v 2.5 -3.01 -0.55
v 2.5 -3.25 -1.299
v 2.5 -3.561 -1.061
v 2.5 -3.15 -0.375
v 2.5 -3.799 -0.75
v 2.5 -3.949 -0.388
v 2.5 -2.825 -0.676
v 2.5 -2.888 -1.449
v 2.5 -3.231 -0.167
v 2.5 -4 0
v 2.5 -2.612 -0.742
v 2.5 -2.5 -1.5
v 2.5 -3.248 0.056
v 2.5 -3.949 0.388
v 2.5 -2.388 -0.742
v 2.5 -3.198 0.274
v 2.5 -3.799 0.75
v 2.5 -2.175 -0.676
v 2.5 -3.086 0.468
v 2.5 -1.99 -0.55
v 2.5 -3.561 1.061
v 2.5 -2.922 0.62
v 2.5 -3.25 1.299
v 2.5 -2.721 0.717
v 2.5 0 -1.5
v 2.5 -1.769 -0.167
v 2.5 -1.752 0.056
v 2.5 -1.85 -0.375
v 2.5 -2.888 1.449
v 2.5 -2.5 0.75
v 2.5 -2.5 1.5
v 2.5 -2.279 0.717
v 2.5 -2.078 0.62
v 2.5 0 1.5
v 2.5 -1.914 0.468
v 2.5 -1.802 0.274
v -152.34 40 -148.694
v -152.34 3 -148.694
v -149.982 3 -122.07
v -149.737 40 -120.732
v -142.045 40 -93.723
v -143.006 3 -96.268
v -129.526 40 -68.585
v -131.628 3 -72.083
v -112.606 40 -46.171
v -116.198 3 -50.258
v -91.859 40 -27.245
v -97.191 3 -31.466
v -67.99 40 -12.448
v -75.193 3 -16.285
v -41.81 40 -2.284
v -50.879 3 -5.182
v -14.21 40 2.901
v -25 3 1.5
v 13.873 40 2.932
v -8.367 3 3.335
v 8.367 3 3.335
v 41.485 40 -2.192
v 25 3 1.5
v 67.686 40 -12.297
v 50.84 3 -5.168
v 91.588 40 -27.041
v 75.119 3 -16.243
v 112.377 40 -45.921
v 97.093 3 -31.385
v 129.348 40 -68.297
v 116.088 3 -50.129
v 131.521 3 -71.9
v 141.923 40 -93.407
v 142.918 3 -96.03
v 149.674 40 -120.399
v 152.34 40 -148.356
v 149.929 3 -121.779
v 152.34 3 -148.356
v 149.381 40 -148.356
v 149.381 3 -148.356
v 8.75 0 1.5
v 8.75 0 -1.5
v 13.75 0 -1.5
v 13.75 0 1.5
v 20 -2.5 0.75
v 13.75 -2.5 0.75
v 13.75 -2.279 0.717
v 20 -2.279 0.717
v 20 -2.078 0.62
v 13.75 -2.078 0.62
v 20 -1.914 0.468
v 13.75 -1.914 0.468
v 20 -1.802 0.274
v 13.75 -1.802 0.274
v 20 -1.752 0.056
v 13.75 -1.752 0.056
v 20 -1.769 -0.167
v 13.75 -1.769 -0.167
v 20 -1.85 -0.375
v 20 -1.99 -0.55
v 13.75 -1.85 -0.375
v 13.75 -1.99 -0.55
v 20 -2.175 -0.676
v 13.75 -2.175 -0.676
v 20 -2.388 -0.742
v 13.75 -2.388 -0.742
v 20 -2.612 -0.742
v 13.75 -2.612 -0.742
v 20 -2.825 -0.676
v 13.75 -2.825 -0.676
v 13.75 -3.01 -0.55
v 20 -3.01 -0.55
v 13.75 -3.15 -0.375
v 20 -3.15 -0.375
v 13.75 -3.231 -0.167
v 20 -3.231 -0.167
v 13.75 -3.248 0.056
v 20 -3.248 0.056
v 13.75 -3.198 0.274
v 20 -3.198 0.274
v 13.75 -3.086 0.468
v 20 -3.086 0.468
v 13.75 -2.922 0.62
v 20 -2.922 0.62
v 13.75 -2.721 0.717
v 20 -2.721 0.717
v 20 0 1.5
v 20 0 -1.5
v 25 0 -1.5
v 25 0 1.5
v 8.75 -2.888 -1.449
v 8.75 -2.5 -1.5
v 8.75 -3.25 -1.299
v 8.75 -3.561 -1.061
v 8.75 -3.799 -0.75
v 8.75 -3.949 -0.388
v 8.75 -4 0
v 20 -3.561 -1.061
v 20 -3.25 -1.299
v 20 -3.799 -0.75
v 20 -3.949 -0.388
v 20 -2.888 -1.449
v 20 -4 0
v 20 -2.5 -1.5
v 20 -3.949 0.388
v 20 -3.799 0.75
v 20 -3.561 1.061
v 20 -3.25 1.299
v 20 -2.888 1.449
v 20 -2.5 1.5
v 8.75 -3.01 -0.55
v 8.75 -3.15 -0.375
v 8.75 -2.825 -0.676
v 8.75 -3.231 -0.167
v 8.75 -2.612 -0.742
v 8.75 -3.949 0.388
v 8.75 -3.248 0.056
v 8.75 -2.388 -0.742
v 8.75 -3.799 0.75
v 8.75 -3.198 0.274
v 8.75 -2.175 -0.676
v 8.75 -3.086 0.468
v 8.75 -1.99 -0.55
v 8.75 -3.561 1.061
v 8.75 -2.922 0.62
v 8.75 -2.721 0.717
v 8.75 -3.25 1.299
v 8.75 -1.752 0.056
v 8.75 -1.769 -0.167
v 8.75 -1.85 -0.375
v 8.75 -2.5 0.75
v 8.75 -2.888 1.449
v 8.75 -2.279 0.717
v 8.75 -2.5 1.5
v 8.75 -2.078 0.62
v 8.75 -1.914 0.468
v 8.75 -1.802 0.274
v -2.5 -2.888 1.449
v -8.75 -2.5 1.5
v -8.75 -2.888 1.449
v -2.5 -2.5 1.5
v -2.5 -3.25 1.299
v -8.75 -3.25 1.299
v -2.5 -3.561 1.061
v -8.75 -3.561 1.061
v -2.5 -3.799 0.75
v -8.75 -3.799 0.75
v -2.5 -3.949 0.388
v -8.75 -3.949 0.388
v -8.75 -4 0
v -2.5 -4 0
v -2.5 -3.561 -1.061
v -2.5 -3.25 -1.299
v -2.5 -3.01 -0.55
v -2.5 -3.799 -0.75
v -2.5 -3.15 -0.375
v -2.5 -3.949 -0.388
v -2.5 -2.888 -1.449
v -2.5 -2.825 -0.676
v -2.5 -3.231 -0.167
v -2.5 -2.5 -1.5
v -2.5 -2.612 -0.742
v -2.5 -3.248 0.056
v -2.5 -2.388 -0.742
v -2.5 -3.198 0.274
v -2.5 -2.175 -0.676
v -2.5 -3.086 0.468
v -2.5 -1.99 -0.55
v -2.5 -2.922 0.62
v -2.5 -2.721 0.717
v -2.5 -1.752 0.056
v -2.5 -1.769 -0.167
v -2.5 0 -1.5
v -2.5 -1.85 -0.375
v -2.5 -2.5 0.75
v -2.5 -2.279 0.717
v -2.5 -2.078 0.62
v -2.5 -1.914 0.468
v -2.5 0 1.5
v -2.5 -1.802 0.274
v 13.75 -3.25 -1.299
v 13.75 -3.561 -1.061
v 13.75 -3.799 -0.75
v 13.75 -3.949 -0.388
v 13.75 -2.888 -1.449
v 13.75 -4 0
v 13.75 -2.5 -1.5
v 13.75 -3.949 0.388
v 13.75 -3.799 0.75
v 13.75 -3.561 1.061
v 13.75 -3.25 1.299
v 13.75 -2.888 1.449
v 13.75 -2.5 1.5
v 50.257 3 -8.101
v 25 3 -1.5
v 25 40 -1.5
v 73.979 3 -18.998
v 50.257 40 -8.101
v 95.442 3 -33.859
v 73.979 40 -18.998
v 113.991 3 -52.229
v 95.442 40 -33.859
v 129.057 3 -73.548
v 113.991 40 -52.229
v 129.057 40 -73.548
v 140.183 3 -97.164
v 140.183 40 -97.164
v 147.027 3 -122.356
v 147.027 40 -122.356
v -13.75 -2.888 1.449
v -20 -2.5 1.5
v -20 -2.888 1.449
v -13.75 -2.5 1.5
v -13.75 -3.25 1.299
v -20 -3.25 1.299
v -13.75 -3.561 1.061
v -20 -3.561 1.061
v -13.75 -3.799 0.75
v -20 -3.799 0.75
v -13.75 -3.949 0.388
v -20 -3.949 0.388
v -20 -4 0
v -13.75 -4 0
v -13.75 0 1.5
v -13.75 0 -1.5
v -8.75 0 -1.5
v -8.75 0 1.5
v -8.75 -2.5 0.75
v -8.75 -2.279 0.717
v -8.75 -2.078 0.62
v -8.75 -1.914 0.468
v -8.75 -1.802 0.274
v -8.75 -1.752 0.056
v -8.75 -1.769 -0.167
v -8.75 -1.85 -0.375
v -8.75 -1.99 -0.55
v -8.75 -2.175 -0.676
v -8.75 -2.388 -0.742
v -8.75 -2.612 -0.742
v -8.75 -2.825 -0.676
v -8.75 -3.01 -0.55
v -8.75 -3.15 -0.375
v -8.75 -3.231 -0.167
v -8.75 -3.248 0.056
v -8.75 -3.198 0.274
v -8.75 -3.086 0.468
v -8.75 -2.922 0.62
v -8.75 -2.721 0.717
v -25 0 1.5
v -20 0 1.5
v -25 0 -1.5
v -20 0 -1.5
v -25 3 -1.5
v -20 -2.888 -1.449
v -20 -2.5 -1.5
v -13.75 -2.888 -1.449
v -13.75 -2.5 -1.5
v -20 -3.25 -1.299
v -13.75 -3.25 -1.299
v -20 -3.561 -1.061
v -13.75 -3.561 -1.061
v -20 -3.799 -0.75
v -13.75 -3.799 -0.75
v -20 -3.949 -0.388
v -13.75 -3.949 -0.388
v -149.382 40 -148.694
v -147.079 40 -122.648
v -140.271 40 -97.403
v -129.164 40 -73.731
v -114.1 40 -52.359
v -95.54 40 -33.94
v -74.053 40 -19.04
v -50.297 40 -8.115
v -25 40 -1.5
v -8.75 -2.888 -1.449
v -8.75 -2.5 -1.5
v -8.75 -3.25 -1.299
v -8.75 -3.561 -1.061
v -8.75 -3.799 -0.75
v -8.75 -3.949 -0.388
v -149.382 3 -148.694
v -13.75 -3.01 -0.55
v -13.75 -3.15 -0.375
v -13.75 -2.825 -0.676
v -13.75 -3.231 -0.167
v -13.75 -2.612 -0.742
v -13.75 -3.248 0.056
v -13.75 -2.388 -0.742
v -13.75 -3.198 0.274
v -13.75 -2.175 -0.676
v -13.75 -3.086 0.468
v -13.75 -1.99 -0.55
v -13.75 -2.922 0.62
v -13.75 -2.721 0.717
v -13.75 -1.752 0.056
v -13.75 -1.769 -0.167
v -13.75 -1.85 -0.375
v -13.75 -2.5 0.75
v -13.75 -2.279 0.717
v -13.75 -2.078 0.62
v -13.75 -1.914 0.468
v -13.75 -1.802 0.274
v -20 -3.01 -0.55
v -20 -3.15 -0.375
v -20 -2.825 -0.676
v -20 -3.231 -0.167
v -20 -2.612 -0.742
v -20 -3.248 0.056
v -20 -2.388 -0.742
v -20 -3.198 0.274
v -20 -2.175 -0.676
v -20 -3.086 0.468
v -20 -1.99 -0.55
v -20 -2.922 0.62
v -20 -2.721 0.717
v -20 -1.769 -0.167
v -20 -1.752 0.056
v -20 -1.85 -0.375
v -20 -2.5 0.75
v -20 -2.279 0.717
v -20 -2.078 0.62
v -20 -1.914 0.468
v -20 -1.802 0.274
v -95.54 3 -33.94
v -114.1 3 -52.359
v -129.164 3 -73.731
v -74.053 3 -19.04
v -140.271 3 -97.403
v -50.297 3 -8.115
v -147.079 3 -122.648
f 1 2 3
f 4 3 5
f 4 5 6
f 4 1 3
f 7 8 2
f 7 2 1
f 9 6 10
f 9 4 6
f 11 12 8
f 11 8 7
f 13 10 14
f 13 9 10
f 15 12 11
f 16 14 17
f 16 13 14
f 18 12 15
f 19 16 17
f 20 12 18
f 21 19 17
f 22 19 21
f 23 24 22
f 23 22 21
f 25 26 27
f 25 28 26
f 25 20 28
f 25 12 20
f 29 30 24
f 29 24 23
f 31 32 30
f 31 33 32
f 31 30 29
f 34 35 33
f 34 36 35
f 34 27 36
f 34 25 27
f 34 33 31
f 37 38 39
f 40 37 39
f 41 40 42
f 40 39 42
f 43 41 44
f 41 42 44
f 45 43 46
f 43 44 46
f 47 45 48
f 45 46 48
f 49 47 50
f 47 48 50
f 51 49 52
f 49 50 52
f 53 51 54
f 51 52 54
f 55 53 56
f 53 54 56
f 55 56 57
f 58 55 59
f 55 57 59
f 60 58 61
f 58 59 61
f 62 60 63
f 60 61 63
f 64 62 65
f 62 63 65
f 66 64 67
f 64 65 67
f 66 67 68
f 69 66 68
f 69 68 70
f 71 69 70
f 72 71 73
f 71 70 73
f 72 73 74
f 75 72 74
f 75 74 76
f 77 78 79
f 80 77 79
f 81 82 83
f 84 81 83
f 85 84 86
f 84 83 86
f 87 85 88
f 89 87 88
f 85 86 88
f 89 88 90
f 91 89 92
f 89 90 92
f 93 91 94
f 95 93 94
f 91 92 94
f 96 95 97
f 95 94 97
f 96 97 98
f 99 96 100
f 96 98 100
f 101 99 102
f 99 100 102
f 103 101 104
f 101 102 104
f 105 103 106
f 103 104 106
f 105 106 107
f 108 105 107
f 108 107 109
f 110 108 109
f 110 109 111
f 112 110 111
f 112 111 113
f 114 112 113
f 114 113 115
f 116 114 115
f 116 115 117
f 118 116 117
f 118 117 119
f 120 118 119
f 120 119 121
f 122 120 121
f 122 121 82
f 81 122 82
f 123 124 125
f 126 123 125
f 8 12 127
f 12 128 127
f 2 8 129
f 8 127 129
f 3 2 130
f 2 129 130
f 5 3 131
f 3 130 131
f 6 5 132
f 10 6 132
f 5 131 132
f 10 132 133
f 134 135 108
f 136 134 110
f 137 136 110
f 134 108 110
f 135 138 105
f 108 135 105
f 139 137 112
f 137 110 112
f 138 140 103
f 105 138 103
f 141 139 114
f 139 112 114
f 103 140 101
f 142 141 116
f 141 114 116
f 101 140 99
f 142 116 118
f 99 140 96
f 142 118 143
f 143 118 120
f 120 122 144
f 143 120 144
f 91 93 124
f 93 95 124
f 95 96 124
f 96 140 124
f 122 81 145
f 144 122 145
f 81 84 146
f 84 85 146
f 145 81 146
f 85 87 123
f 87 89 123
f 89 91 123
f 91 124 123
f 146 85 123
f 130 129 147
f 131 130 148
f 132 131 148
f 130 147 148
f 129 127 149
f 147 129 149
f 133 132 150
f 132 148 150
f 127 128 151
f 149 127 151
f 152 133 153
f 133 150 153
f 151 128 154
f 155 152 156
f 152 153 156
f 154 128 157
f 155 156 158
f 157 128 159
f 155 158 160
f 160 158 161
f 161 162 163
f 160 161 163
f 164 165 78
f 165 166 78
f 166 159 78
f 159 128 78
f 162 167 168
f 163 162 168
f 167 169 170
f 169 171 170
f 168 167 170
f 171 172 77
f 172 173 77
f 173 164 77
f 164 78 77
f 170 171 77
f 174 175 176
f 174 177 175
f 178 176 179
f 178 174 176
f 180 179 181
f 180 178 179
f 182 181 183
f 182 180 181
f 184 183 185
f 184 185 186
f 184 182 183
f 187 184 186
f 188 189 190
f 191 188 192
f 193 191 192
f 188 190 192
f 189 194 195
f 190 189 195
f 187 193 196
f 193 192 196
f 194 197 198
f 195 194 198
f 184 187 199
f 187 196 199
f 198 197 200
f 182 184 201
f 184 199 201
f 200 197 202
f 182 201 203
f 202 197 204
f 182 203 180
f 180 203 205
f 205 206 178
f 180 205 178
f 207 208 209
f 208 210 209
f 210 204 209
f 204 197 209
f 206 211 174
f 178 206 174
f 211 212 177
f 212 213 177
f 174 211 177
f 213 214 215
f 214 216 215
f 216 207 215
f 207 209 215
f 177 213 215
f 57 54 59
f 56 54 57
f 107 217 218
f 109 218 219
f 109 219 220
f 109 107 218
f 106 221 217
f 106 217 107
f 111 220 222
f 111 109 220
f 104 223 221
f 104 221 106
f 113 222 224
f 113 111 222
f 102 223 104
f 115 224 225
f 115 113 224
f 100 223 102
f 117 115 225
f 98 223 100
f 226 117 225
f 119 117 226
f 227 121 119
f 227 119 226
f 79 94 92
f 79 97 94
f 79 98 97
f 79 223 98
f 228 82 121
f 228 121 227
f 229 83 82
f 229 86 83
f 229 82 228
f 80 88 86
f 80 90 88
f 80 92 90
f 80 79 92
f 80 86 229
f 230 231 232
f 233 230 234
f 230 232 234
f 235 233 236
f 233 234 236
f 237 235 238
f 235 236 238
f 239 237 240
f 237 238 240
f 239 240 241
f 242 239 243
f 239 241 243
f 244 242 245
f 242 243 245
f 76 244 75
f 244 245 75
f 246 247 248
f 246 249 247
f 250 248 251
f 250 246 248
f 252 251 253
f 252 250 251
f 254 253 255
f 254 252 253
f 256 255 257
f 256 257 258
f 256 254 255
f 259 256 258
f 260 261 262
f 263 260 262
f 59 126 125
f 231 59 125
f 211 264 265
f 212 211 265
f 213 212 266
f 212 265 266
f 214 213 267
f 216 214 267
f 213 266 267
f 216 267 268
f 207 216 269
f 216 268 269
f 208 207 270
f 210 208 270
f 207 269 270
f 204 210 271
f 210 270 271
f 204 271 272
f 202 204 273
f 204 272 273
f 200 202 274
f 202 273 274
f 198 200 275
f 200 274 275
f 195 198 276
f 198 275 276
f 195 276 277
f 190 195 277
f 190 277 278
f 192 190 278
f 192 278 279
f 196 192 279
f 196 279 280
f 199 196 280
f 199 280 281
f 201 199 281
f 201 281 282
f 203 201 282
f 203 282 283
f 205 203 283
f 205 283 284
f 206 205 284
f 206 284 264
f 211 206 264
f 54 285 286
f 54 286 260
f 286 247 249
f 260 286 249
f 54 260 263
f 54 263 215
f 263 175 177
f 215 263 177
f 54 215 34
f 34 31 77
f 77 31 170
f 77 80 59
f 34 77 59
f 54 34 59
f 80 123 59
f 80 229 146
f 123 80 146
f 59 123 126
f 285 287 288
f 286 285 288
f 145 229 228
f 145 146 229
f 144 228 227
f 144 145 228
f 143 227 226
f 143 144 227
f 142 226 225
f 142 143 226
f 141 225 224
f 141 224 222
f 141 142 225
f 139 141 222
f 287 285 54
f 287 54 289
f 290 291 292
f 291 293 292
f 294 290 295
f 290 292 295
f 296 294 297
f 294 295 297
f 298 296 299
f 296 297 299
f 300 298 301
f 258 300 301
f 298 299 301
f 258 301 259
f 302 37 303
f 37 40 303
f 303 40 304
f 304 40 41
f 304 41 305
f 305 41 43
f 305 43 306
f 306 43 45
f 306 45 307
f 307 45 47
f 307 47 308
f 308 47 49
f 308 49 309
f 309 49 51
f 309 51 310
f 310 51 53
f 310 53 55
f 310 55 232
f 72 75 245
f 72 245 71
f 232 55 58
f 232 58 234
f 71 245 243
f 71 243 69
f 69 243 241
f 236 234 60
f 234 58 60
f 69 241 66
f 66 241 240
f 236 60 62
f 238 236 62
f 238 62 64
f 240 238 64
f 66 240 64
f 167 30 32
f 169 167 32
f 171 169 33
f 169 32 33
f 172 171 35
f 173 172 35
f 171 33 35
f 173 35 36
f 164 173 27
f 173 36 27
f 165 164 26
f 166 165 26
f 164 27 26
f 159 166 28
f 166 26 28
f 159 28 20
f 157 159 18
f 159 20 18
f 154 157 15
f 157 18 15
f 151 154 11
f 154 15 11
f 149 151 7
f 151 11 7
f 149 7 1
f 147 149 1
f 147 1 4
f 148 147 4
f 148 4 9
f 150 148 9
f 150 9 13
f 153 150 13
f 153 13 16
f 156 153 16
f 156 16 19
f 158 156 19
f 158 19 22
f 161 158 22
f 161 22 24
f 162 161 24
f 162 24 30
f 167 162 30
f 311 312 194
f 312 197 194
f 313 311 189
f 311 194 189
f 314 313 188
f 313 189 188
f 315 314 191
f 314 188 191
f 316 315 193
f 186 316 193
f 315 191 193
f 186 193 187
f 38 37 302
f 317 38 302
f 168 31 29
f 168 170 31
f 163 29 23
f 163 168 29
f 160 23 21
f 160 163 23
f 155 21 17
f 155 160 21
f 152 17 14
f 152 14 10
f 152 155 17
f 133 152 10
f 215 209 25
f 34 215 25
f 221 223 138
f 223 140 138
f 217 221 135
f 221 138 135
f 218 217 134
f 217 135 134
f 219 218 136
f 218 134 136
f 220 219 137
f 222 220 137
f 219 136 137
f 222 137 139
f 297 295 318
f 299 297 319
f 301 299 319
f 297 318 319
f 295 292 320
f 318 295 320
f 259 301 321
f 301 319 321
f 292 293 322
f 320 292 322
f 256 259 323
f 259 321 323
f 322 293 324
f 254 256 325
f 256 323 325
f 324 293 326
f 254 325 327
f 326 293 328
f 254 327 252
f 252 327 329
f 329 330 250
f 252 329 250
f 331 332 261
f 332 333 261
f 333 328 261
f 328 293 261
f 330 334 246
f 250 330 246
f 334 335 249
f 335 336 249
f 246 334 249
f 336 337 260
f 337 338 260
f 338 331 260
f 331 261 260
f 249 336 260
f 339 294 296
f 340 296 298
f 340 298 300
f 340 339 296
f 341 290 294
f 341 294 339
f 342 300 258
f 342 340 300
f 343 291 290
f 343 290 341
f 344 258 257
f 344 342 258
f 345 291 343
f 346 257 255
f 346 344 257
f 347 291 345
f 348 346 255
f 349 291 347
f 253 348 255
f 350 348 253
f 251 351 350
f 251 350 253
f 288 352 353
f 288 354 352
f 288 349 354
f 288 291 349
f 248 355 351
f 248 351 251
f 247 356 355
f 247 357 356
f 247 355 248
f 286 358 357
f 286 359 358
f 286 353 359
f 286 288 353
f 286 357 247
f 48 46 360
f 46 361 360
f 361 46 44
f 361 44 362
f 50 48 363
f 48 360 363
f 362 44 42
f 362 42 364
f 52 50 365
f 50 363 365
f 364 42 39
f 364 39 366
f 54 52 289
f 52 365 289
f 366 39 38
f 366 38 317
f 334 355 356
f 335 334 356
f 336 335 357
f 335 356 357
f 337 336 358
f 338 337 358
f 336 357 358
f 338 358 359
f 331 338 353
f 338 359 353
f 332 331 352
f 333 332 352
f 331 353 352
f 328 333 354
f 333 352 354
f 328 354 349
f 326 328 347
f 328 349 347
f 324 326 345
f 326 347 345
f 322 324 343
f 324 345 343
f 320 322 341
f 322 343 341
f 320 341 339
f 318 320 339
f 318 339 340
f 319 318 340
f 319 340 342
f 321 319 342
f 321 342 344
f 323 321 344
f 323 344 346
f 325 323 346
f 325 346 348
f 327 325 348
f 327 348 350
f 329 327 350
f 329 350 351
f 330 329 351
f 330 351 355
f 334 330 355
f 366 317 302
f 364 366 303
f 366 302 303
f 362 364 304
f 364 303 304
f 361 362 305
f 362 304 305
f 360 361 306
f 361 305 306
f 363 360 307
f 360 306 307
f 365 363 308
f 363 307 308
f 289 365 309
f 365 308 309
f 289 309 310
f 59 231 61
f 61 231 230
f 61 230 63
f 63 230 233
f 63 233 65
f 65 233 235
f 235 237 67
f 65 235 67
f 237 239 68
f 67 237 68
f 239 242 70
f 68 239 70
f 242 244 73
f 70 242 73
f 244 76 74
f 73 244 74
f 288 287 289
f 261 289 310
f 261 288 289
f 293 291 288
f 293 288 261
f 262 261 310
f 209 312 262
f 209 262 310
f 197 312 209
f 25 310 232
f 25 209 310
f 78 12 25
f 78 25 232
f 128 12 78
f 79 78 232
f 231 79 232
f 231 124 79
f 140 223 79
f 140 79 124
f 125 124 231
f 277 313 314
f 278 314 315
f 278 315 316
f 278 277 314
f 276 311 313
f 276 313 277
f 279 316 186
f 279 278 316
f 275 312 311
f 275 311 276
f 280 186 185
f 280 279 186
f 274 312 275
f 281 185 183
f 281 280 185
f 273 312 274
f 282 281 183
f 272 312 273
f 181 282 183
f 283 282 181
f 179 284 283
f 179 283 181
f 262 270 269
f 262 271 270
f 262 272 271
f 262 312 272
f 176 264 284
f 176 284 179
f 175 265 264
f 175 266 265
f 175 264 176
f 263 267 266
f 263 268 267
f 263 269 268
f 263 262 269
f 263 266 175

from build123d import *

# Parameters (mm, degrees)
SKETCH1_W              = 50
SKETCH1_H              = 3
BOSS_EXTRUDE1_DEPTH    = 40
SKETCH2_W              = 6.25
SKETCH2_H              = 3
BOSS_EXTRUDE2_DEPTH    = 4
FILLET1_R              = 1.5
LPATTERN1_COUNT        = 4
LPATTERN1_PITCH        = 11.25
FILLET1_OF_LPATTERN1_R = 1.5
SKETCH3_W              = 3
SKETCH3_H              = 37
SKETCH8_R              = 0.75
CUT_EXTRUDE1_DEPTH     = 232.430553417
CUT_EXTRUDE2_DEPTH     = 218.721568988


with BuildPart() as part:
    # Sketch1 → Boss-Extrude1 (new body)
    with BuildSketch(Plane(origin=(0, 0, 0), x_dir=(1, 0, 0), z_dir=(0, 1, 0))):
        Rectangle(SKETCH1_W, SKETCH1_H)
    extrude(amount=BOSS_EXTRUDE1_DEPTH)

    # Sketch2 → Boss-Extrude2 (add)
    with BuildSketch(Plane.XZ):
        with Locations((-16.875, 0)):
            Rectangle(SKETCH2_W, SKETCH2_H)
    boss_extrude2 = extrude(amount=BOSS_EXTRUDE2_DEPTH)

    # Fillet1
    fillet1_edges = [part.edges().sort_by_distance(p)[0] for p in [
        (-16.875, -4, 1.5),
        (-16.875, -4, -1.5),
    ]]
    fillet(fillet1_edges, radius=FILLET1_R - 0.0001)  # a hair under: the kernel refuses the full size

    # LPattern1: Boss-Extrude2 ×4
    with Locations(*[(i * LPATTERN1_PITCH, 0, 0) for i in range(1, LPATTERN1_COUNT)]):
        add(boss_extrude2)

    # Fillet1 of LPattern1
    fillet1_of_lpattern1_edges = [part.edges().sort_by_distance(p)[0] for p in [
        (-5.625, -4, 1.5),
        (-5.625, -4, -1.5),
        (5.625, -4, 1.5),
        (5.625, -4, -1.5),
        (16.875, -4, 1.5),
        (16.875, -4, -1.5),
    ]]
    fillet(fillet1_of_lpattern1_edges, radius=FILLET1_OF_LPATTERN1_R - 0.0001)  # a hair under: the kernel refuses the full size

    # Sweep2: sweep along a path in Sketch7
    with BuildLine(Plane(origin=(0, 38.5, 0), x_dir=(1, 0, 0), z_dir=(0, 1, 0))) as sweep2_path:
        ThreePointArc((-149.86, 148.775138892), (0, -1.084861108), (149.86, 148.775138892))
    # Sketch3 → Sweep2 (sweep)
    with BuildSketch(Plane(origin=(25, 0, 0), x_dir=(0, 0, -1), z_dir=(1, 0, 0))):
        with Locations((0, 21.5)):
            Rectangle(SKETCH3_W, SKETCH3_H)
    sweep(path=sweep2_path.line)

    # Sketch8 → Cut-Extrude1 (cut, through all)
    with BuildSketch(Plane.ZY.offset(20)):
        with Locations((0, -2.5)):
            Circle(SKETCH8_R)
    extrude(amount=-CUT_EXTRUDE1_DEPTH, mode=Mode.SUBTRACT)

    # Sketch9 → Cut-Extrude2 (cut, through all)
    with BuildSketch(Plane(origin=(0, 40, 0), x_dir=(1, 0, 0), z_dir=(0, 1, 0))):
        Polygon((-149.381926595, 148.694252085), (-152.34044383, 148.694252085), (-152.443464298, 148.694252085), (-152.443464298, 149.267987832), align=None)
        Polygon((152.339887493, 148.355558597), (149.339735724, 148.355558597), (149.381926595, 148.856025699), align=None)
    extrude(amount=-CUT_EXTRUDE2_DEPTH, mode=Mode.SUBTRACT)


solid = part.part
